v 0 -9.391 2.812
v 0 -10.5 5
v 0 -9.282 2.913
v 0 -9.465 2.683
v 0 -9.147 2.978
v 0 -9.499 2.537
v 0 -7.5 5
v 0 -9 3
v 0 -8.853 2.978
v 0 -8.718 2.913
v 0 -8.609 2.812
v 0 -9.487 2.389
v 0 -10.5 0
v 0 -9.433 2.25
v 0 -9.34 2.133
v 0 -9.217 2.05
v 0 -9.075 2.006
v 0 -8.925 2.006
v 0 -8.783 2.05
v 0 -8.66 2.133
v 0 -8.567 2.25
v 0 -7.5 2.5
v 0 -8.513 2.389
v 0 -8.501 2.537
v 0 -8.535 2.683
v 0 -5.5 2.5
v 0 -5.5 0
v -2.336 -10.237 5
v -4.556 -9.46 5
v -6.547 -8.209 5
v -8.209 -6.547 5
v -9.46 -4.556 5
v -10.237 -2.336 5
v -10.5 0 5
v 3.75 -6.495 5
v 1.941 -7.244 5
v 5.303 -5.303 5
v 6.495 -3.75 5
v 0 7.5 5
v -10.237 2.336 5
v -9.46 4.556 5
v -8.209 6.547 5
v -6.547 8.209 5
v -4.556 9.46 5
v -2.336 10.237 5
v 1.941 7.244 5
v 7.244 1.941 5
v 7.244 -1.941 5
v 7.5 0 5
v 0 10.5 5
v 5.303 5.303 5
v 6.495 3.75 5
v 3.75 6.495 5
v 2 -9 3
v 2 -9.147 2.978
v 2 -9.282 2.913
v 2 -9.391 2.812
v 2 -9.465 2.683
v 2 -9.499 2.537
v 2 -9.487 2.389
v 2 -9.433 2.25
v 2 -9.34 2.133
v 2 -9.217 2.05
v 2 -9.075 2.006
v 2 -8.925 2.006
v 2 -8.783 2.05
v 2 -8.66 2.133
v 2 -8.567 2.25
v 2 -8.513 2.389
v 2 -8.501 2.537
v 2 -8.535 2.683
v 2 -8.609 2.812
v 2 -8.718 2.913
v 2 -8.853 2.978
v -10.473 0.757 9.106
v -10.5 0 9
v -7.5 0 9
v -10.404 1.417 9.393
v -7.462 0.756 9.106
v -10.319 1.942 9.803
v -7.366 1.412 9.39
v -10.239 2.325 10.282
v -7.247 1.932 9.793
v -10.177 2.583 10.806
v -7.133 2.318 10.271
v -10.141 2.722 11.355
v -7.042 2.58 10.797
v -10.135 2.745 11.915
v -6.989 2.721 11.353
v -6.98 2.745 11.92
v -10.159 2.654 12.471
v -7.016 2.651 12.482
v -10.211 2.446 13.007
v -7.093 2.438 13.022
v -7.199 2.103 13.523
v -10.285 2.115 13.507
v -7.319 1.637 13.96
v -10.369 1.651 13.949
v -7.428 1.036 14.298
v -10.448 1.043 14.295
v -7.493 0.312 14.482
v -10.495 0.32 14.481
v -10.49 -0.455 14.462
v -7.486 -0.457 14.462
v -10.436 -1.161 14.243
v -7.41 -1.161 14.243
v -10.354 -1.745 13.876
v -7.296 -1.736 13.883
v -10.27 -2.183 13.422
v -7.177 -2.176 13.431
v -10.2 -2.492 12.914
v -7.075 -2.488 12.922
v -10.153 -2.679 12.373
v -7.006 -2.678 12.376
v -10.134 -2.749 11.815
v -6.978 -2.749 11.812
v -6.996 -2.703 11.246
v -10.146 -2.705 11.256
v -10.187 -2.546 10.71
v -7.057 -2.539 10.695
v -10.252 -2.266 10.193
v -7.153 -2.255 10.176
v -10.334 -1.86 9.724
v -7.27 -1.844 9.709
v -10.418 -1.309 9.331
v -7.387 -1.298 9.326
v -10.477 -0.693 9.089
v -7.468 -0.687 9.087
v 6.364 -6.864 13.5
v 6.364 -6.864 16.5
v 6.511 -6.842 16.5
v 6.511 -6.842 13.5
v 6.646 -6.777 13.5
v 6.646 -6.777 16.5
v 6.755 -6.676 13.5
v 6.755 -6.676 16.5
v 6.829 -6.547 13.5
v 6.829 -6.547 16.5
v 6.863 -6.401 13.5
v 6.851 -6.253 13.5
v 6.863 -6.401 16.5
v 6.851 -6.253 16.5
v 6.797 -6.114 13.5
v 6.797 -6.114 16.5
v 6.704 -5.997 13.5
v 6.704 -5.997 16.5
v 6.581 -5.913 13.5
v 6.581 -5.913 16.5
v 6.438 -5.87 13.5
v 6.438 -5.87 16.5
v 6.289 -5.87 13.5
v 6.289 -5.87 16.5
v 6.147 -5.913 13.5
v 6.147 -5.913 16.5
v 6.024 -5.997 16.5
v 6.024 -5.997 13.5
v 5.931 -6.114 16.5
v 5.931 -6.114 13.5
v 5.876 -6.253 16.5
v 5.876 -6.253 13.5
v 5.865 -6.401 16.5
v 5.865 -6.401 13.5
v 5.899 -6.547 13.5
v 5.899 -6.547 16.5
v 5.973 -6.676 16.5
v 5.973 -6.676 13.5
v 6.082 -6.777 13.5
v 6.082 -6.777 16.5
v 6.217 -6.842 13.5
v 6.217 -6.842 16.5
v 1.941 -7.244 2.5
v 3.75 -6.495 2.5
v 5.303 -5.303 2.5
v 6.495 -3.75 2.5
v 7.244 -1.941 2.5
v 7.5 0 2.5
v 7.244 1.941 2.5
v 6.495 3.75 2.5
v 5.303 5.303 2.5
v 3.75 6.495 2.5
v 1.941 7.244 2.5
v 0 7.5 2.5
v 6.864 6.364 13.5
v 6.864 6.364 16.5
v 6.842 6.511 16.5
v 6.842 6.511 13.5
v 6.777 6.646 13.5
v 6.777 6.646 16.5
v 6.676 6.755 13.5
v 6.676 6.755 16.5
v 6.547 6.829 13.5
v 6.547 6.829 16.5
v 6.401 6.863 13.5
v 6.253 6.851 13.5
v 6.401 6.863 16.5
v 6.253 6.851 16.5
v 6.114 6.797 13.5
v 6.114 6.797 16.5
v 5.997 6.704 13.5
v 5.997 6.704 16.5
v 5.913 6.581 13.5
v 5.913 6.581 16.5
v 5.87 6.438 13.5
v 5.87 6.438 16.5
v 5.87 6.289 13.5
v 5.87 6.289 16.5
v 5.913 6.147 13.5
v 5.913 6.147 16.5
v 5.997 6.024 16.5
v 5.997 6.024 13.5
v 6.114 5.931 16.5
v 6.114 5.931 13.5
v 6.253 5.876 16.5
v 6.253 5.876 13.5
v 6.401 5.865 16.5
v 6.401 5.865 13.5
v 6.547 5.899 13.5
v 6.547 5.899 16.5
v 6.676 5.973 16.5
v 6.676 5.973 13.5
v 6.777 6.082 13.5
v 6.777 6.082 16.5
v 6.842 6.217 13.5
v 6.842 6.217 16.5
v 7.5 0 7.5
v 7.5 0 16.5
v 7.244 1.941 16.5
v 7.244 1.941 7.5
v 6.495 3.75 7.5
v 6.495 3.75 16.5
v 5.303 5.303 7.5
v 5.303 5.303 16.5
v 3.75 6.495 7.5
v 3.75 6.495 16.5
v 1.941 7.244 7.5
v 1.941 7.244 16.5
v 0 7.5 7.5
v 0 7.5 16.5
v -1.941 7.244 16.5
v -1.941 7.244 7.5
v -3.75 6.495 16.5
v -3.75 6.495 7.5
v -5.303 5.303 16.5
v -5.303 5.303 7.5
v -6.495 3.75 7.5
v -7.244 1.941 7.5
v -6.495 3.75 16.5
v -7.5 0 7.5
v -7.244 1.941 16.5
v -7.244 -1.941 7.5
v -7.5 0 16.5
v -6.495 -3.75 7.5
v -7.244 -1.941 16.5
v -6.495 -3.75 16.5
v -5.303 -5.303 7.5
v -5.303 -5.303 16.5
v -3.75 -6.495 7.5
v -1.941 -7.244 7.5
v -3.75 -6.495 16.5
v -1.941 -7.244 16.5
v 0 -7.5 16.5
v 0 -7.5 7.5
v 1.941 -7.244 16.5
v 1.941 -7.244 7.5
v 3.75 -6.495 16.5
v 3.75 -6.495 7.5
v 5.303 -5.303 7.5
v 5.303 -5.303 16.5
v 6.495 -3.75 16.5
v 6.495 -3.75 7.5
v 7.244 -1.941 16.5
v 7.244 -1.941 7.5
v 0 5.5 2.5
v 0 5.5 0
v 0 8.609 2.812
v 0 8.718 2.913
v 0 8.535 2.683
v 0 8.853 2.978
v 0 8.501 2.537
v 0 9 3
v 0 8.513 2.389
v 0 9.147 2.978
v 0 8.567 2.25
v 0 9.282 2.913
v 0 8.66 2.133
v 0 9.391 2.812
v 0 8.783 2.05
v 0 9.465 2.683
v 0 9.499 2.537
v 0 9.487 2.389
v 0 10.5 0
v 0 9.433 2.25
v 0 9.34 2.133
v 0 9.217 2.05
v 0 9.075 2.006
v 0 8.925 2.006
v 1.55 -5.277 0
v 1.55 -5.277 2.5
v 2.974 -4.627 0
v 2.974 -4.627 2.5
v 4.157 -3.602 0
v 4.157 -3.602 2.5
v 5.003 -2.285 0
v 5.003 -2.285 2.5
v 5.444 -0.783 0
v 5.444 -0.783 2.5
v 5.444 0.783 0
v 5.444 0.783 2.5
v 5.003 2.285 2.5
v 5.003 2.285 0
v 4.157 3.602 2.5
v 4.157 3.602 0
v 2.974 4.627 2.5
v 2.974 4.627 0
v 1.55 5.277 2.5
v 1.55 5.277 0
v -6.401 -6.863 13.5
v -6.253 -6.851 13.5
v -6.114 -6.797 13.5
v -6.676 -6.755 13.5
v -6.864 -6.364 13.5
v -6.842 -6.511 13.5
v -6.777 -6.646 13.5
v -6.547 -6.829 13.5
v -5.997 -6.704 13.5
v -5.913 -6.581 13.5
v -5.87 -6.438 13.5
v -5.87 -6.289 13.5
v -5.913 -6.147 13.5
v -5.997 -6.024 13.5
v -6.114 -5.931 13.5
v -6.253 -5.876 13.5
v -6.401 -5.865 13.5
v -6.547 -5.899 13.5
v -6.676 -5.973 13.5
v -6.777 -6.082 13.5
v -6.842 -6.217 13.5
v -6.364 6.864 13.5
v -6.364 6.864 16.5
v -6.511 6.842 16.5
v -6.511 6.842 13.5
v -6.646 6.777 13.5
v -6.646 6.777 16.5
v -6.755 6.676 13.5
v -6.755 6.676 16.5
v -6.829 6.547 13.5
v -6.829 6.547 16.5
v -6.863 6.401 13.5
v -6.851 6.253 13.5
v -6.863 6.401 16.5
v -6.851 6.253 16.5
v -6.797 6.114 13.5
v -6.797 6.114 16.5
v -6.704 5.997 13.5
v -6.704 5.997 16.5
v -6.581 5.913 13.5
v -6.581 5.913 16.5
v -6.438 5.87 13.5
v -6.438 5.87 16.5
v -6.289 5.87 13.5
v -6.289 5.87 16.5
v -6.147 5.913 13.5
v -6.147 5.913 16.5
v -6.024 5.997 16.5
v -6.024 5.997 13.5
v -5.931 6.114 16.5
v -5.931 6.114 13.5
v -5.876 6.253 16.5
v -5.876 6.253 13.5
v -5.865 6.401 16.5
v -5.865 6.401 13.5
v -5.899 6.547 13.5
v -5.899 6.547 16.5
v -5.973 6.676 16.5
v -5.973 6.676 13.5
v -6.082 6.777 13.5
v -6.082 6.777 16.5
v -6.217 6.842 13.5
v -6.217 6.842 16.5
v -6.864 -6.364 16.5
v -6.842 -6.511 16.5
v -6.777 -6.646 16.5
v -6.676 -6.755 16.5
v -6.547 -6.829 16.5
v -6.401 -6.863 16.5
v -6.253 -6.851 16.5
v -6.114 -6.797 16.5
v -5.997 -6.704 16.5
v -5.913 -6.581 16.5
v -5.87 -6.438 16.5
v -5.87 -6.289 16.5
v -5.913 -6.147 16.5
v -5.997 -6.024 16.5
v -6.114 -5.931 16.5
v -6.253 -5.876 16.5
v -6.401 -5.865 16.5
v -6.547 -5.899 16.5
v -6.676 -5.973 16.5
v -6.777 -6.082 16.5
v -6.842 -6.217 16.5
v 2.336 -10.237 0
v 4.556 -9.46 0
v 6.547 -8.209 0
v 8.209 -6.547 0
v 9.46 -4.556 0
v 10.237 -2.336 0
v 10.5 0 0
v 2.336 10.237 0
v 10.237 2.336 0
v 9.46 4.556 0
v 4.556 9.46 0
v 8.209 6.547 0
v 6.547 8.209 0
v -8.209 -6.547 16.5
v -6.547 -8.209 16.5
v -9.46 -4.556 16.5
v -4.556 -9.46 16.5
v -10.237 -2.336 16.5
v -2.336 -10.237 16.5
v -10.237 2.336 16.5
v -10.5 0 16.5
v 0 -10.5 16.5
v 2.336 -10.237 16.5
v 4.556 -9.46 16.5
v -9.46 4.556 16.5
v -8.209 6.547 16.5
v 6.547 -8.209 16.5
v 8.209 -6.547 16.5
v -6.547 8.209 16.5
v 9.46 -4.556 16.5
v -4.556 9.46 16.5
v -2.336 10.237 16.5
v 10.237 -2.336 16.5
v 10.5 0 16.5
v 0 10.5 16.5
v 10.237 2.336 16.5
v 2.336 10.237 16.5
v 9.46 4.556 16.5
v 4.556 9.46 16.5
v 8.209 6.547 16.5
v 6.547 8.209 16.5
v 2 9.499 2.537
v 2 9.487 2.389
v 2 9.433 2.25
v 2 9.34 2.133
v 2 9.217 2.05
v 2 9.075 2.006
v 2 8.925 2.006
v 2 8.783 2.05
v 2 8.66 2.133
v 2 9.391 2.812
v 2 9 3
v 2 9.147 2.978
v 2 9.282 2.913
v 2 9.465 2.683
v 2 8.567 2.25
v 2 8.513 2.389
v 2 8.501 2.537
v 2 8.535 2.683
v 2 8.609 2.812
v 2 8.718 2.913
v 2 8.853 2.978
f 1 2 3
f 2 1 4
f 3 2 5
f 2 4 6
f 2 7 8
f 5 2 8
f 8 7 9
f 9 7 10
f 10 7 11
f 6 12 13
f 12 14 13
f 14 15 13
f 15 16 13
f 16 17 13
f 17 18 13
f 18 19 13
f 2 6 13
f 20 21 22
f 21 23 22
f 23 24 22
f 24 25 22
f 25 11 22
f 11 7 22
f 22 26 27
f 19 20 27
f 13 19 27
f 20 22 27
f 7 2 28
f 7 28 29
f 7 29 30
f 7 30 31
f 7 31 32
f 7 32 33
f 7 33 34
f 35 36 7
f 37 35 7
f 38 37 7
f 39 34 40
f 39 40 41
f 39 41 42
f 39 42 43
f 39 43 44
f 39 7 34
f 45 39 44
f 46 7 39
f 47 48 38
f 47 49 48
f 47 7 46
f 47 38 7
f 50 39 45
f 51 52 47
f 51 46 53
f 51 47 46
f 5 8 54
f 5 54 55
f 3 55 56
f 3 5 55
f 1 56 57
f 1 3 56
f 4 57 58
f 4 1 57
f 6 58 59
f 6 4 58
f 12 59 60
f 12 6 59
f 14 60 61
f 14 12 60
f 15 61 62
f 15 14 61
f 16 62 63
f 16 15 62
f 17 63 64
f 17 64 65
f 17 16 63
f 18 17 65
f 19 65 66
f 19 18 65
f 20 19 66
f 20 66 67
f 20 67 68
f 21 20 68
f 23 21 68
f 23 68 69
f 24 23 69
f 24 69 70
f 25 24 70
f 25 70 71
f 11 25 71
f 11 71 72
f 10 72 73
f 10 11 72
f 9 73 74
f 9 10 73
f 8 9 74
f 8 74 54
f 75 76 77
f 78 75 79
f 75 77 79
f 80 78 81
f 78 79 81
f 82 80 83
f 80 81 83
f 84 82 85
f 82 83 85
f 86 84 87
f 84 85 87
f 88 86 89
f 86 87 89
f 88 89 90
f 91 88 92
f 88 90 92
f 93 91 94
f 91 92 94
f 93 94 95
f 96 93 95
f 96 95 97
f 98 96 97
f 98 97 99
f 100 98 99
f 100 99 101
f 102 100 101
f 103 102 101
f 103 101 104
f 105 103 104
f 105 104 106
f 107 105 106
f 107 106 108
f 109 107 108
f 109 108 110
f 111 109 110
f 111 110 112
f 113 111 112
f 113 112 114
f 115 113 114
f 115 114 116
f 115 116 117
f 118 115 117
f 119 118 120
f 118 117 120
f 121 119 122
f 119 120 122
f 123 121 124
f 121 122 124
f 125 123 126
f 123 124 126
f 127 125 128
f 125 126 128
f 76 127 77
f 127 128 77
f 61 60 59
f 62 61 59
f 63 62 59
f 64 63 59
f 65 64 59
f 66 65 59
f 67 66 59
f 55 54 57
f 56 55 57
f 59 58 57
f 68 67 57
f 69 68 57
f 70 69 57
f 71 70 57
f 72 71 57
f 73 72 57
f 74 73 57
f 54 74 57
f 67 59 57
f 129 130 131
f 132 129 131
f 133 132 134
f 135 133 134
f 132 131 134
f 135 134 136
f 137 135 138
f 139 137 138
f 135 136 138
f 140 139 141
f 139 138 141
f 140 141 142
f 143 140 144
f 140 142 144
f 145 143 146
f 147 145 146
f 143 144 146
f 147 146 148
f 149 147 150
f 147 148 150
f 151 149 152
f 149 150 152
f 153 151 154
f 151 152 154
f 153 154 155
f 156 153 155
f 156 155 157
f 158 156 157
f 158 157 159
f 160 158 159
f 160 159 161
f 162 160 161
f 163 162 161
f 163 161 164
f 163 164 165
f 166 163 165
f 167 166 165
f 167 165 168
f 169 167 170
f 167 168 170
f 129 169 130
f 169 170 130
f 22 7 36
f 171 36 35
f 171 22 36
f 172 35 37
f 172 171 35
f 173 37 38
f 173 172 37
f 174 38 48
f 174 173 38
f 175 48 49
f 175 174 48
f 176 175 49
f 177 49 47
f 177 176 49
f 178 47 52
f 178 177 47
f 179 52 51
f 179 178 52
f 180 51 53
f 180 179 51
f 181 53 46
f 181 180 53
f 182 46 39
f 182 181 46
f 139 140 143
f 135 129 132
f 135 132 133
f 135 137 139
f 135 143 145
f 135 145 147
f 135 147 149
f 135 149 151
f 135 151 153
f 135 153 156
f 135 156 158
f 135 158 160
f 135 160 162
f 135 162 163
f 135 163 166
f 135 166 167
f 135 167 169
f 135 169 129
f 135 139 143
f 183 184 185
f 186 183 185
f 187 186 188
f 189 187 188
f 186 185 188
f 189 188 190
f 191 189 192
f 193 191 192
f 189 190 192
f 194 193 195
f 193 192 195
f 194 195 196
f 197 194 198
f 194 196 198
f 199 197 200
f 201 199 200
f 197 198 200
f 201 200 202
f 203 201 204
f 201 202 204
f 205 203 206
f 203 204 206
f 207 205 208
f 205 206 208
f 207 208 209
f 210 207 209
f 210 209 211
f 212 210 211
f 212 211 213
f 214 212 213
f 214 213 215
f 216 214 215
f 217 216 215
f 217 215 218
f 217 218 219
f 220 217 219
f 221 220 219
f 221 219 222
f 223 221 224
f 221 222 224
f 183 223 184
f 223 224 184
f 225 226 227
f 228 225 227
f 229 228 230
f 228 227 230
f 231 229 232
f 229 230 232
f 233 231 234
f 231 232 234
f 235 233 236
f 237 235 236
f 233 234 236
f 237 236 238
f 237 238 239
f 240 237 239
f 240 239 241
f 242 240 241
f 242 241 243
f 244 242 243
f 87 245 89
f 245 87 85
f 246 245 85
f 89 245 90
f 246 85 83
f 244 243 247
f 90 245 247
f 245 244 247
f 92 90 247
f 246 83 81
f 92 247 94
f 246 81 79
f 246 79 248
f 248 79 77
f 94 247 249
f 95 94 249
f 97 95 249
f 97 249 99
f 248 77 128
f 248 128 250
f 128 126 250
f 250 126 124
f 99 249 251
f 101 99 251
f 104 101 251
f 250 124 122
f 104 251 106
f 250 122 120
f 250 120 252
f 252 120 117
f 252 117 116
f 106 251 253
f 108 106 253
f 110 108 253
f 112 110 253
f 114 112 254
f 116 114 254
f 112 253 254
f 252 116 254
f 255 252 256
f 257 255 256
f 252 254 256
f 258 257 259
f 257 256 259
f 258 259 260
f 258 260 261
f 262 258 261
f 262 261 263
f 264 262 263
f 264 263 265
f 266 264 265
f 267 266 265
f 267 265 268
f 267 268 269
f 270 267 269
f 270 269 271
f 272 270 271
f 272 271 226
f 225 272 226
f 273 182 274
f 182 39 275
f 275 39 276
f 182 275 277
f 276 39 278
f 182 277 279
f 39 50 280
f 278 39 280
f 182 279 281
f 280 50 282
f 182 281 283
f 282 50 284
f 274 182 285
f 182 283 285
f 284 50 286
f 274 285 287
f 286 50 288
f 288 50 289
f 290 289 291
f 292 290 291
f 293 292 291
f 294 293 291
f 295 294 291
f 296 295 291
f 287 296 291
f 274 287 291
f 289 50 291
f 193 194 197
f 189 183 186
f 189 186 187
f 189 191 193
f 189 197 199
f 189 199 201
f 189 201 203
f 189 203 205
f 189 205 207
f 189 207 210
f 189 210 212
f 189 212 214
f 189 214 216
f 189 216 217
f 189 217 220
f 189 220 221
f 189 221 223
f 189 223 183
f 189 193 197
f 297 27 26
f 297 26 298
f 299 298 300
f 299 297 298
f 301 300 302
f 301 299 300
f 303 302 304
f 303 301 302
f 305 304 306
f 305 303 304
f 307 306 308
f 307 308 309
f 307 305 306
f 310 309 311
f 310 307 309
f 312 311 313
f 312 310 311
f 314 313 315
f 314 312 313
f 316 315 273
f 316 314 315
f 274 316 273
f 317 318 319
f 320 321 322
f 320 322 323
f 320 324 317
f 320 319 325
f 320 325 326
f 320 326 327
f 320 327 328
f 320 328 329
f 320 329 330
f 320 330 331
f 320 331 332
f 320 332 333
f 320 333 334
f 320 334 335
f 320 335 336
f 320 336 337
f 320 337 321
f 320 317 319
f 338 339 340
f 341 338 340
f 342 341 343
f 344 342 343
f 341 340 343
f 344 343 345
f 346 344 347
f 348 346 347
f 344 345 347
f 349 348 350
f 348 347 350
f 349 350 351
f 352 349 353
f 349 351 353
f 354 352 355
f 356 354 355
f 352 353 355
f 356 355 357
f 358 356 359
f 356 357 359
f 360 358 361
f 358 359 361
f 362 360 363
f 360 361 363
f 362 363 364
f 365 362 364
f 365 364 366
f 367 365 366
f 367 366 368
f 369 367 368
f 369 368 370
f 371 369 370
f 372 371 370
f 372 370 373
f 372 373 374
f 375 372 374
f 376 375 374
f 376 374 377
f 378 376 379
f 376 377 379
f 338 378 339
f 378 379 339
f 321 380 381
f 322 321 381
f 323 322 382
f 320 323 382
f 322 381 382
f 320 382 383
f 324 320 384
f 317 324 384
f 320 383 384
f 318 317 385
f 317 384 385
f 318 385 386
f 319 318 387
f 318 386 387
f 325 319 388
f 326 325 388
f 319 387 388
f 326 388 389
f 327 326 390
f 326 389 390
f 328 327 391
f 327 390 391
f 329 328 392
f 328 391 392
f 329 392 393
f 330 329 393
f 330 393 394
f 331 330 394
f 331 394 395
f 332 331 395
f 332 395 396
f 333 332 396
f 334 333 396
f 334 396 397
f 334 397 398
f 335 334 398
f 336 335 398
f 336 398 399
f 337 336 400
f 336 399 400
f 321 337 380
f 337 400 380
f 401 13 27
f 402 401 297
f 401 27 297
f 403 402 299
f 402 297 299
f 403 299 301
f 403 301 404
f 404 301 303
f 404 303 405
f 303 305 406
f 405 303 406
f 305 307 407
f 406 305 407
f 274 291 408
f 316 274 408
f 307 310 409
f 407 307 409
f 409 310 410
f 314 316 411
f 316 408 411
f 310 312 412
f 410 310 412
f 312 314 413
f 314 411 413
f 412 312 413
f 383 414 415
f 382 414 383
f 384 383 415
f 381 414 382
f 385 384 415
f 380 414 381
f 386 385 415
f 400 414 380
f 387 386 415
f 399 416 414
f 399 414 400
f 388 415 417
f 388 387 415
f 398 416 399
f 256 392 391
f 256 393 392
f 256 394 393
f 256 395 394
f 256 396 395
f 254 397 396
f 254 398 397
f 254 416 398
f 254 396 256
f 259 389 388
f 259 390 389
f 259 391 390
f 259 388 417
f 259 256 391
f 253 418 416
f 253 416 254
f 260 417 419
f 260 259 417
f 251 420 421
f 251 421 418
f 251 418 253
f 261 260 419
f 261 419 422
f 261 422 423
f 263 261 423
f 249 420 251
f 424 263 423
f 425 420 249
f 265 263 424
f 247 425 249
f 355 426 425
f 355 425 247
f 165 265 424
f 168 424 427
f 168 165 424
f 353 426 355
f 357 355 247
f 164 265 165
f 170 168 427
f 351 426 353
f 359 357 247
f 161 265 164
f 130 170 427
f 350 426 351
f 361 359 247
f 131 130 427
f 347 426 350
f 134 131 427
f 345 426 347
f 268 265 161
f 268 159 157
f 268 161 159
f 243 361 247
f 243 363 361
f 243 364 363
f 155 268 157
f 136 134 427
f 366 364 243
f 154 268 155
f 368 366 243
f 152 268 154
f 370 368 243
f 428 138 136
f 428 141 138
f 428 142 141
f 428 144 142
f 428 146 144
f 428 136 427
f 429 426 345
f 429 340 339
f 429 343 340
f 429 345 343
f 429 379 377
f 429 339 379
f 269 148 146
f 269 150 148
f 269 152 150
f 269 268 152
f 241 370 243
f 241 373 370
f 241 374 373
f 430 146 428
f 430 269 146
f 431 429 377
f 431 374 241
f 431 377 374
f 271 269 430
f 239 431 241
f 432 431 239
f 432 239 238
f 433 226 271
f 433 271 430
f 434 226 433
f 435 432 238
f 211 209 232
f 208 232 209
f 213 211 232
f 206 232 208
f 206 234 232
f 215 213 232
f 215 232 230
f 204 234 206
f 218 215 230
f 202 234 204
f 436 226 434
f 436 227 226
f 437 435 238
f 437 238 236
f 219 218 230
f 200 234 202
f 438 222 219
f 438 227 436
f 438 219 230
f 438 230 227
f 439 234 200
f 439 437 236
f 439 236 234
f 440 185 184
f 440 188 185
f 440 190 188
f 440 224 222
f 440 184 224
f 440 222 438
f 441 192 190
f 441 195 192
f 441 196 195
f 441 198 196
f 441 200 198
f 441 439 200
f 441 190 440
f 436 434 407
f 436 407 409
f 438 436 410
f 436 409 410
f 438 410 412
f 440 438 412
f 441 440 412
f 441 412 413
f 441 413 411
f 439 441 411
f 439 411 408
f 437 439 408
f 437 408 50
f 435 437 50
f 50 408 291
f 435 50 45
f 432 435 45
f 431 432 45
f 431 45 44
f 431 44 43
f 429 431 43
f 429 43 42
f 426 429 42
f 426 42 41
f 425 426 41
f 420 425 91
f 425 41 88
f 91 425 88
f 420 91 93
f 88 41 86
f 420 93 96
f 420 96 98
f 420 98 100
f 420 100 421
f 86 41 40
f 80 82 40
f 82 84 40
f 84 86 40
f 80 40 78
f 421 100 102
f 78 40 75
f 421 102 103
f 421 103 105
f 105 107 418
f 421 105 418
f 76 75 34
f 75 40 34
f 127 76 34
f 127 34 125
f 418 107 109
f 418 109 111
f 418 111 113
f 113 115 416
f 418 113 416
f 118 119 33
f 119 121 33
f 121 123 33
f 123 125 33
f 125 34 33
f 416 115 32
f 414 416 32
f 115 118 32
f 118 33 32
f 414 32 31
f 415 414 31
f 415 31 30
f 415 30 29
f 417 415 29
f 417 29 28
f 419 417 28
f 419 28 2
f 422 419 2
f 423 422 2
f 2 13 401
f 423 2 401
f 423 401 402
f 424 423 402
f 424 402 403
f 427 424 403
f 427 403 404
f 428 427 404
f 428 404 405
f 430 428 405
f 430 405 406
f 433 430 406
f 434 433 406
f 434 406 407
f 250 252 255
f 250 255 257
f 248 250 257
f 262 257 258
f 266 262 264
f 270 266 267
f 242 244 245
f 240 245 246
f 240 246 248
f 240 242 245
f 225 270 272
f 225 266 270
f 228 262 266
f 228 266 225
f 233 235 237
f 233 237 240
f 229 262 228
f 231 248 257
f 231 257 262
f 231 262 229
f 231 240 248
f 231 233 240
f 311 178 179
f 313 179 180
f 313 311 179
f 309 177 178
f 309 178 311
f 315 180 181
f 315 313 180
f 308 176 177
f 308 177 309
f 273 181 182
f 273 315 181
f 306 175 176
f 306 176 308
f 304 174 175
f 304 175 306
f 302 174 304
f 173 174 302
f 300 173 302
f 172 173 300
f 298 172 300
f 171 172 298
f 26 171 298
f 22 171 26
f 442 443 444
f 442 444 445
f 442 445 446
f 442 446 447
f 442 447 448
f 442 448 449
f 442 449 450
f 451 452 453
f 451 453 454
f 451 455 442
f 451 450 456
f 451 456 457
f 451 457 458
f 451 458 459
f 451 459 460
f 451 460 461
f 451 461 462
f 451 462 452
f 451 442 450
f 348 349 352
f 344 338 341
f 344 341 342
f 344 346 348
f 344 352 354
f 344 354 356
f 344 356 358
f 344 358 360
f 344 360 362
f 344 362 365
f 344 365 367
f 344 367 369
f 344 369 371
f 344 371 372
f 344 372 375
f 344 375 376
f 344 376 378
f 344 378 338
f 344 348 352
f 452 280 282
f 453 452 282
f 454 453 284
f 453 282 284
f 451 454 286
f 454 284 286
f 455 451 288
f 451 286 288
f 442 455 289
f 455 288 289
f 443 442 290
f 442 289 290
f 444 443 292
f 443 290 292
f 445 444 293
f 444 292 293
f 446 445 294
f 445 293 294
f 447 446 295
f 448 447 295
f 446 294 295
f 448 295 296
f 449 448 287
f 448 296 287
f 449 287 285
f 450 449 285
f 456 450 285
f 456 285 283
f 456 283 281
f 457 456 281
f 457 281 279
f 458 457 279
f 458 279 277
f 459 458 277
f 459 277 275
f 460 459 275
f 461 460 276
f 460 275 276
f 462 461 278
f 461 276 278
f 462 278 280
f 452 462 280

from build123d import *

# Parameters (mm, degrees)
SKETCH1_R           = 10.5
BOSS_EXTRUDE1_DEPTH = 16.5
SKETCH2_R           = 7.5
CUT_EXTRUDE1_DEPTH  = 9
SKETCH15_R          = 0.5
CUT_EXTRUDE10_DEPTH = 3
CIRPATTERN1_COUNT   = 4
SKETCH11_R          = 2.75
CUT_EXTRUDE6_DEPTH  = 23.19797288
SKETCH13_W          = 5
SKETCH13_H          = 21
CUT_EXTRUDE8_DEPTH  = 23.197973064
SKETCH14_R          = 0.5
CUT_EXTRUDE9_DEPTH  = 2


with BuildPart() as part:
    # Sketch1 → Boss-Extrude1 (new body)
    with BuildSketch(Plane.XY):
        Circle(SKETCH1_R)
    extrude(amount=BOSS_EXTRUDE1_DEPTH)

    # Sketch2 → Cut-Extrude1 (cut)
    with BuildSketch(Plane.XY.offset(16.5)):
        Circle(SKETCH2_R)
    extrude(amount=-CUT_EXTRUDE1_DEPTH, mode=Mode.SUBTRACT)

    # Sketch15 → Cut-Extrude10 (cut)
    with BuildSketch(Plane.XY.offset(16.5)):
        with Locations((6.363961031, 6.363961031)):
            Circle(SKETCH15_R)
    cut_extrude10 = extrude(amount=-CUT_EXTRUDE10_DEPTH, mode=Mode.SUBTRACT)

    # CirPattern1: Cut-Extrude10 ×4 about axis
    cirpattern1_axis = Axis((0, 0, 16.5), (0, 0, -1))
    for i in range(1, CIRPATTERN1_COUNT):
        add(cut_extrude10.rotate(cirpattern1_axis, i * 360 / CIRPATTERN1_COUNT), mode=Mode.SUBTRACT)

    # Sketch9 → Cut-Revolve1 (revolve, cut)
    with BuildSketch(Plane(origin=(0, 0, 0), x_dir=(0, 0, -1), z_dir=(1, 0, 0))):
        Polygon((-5, 0), (-5, 7.5), (-2.5, 7.5), (-2.5, 5.5), (0, 5.5), (0, 0), align=None)
    revolve(axis=Axis((0, 0, 0), (0, 0, 1)), mode=Mode.SUBTRACT)

    # Sketch11 → Cut-Extrude6 (cut, through all)
    with BuildSketch(Plane(origin=(0, 0, 0), x_dir=(0, 0, -1), z_dir=(1, 0, 0))):
        with Locations((-11.75, 0)):
            Circle(SKETCH11_R)
    extrude(amount=-CUT_EXTRUDE6_DEPTH, mode=Mode.SUBTRACT)

    # Sketch13 → Cut-Extrude8 (cut, through all)
    with BuildSketch(Plane(origin=(0, 0, 0), x_dir=(0, 0, -1), z_dir=(1, 0, 0))):
        with Locations((-2.5, 0)):
            Rectangle(SKETCH13_W, SKETCH13_H)
    extrude(amount=-CUT_EXTRUDE8_DEPTH, mode=Mode.SUBTRACT)

    # Sketch14 → Cut-Extrude9 (cut)
    with BuildSketch(Plane.ZY):
        with Locations((2.5, 9)):
            Circle(SKETCH14_R)
    cut_extrude9 = extrude(amount=-CUT_EXTRUDE9_DEPTH, mode=Mode.SUBTRACT)

    # Mirror1: Cut-Extrude9 across plane
    add(cut_extrude9.mirror(Plane.ZX), mode=Mode.SUBTRACT)


solid = part.part
